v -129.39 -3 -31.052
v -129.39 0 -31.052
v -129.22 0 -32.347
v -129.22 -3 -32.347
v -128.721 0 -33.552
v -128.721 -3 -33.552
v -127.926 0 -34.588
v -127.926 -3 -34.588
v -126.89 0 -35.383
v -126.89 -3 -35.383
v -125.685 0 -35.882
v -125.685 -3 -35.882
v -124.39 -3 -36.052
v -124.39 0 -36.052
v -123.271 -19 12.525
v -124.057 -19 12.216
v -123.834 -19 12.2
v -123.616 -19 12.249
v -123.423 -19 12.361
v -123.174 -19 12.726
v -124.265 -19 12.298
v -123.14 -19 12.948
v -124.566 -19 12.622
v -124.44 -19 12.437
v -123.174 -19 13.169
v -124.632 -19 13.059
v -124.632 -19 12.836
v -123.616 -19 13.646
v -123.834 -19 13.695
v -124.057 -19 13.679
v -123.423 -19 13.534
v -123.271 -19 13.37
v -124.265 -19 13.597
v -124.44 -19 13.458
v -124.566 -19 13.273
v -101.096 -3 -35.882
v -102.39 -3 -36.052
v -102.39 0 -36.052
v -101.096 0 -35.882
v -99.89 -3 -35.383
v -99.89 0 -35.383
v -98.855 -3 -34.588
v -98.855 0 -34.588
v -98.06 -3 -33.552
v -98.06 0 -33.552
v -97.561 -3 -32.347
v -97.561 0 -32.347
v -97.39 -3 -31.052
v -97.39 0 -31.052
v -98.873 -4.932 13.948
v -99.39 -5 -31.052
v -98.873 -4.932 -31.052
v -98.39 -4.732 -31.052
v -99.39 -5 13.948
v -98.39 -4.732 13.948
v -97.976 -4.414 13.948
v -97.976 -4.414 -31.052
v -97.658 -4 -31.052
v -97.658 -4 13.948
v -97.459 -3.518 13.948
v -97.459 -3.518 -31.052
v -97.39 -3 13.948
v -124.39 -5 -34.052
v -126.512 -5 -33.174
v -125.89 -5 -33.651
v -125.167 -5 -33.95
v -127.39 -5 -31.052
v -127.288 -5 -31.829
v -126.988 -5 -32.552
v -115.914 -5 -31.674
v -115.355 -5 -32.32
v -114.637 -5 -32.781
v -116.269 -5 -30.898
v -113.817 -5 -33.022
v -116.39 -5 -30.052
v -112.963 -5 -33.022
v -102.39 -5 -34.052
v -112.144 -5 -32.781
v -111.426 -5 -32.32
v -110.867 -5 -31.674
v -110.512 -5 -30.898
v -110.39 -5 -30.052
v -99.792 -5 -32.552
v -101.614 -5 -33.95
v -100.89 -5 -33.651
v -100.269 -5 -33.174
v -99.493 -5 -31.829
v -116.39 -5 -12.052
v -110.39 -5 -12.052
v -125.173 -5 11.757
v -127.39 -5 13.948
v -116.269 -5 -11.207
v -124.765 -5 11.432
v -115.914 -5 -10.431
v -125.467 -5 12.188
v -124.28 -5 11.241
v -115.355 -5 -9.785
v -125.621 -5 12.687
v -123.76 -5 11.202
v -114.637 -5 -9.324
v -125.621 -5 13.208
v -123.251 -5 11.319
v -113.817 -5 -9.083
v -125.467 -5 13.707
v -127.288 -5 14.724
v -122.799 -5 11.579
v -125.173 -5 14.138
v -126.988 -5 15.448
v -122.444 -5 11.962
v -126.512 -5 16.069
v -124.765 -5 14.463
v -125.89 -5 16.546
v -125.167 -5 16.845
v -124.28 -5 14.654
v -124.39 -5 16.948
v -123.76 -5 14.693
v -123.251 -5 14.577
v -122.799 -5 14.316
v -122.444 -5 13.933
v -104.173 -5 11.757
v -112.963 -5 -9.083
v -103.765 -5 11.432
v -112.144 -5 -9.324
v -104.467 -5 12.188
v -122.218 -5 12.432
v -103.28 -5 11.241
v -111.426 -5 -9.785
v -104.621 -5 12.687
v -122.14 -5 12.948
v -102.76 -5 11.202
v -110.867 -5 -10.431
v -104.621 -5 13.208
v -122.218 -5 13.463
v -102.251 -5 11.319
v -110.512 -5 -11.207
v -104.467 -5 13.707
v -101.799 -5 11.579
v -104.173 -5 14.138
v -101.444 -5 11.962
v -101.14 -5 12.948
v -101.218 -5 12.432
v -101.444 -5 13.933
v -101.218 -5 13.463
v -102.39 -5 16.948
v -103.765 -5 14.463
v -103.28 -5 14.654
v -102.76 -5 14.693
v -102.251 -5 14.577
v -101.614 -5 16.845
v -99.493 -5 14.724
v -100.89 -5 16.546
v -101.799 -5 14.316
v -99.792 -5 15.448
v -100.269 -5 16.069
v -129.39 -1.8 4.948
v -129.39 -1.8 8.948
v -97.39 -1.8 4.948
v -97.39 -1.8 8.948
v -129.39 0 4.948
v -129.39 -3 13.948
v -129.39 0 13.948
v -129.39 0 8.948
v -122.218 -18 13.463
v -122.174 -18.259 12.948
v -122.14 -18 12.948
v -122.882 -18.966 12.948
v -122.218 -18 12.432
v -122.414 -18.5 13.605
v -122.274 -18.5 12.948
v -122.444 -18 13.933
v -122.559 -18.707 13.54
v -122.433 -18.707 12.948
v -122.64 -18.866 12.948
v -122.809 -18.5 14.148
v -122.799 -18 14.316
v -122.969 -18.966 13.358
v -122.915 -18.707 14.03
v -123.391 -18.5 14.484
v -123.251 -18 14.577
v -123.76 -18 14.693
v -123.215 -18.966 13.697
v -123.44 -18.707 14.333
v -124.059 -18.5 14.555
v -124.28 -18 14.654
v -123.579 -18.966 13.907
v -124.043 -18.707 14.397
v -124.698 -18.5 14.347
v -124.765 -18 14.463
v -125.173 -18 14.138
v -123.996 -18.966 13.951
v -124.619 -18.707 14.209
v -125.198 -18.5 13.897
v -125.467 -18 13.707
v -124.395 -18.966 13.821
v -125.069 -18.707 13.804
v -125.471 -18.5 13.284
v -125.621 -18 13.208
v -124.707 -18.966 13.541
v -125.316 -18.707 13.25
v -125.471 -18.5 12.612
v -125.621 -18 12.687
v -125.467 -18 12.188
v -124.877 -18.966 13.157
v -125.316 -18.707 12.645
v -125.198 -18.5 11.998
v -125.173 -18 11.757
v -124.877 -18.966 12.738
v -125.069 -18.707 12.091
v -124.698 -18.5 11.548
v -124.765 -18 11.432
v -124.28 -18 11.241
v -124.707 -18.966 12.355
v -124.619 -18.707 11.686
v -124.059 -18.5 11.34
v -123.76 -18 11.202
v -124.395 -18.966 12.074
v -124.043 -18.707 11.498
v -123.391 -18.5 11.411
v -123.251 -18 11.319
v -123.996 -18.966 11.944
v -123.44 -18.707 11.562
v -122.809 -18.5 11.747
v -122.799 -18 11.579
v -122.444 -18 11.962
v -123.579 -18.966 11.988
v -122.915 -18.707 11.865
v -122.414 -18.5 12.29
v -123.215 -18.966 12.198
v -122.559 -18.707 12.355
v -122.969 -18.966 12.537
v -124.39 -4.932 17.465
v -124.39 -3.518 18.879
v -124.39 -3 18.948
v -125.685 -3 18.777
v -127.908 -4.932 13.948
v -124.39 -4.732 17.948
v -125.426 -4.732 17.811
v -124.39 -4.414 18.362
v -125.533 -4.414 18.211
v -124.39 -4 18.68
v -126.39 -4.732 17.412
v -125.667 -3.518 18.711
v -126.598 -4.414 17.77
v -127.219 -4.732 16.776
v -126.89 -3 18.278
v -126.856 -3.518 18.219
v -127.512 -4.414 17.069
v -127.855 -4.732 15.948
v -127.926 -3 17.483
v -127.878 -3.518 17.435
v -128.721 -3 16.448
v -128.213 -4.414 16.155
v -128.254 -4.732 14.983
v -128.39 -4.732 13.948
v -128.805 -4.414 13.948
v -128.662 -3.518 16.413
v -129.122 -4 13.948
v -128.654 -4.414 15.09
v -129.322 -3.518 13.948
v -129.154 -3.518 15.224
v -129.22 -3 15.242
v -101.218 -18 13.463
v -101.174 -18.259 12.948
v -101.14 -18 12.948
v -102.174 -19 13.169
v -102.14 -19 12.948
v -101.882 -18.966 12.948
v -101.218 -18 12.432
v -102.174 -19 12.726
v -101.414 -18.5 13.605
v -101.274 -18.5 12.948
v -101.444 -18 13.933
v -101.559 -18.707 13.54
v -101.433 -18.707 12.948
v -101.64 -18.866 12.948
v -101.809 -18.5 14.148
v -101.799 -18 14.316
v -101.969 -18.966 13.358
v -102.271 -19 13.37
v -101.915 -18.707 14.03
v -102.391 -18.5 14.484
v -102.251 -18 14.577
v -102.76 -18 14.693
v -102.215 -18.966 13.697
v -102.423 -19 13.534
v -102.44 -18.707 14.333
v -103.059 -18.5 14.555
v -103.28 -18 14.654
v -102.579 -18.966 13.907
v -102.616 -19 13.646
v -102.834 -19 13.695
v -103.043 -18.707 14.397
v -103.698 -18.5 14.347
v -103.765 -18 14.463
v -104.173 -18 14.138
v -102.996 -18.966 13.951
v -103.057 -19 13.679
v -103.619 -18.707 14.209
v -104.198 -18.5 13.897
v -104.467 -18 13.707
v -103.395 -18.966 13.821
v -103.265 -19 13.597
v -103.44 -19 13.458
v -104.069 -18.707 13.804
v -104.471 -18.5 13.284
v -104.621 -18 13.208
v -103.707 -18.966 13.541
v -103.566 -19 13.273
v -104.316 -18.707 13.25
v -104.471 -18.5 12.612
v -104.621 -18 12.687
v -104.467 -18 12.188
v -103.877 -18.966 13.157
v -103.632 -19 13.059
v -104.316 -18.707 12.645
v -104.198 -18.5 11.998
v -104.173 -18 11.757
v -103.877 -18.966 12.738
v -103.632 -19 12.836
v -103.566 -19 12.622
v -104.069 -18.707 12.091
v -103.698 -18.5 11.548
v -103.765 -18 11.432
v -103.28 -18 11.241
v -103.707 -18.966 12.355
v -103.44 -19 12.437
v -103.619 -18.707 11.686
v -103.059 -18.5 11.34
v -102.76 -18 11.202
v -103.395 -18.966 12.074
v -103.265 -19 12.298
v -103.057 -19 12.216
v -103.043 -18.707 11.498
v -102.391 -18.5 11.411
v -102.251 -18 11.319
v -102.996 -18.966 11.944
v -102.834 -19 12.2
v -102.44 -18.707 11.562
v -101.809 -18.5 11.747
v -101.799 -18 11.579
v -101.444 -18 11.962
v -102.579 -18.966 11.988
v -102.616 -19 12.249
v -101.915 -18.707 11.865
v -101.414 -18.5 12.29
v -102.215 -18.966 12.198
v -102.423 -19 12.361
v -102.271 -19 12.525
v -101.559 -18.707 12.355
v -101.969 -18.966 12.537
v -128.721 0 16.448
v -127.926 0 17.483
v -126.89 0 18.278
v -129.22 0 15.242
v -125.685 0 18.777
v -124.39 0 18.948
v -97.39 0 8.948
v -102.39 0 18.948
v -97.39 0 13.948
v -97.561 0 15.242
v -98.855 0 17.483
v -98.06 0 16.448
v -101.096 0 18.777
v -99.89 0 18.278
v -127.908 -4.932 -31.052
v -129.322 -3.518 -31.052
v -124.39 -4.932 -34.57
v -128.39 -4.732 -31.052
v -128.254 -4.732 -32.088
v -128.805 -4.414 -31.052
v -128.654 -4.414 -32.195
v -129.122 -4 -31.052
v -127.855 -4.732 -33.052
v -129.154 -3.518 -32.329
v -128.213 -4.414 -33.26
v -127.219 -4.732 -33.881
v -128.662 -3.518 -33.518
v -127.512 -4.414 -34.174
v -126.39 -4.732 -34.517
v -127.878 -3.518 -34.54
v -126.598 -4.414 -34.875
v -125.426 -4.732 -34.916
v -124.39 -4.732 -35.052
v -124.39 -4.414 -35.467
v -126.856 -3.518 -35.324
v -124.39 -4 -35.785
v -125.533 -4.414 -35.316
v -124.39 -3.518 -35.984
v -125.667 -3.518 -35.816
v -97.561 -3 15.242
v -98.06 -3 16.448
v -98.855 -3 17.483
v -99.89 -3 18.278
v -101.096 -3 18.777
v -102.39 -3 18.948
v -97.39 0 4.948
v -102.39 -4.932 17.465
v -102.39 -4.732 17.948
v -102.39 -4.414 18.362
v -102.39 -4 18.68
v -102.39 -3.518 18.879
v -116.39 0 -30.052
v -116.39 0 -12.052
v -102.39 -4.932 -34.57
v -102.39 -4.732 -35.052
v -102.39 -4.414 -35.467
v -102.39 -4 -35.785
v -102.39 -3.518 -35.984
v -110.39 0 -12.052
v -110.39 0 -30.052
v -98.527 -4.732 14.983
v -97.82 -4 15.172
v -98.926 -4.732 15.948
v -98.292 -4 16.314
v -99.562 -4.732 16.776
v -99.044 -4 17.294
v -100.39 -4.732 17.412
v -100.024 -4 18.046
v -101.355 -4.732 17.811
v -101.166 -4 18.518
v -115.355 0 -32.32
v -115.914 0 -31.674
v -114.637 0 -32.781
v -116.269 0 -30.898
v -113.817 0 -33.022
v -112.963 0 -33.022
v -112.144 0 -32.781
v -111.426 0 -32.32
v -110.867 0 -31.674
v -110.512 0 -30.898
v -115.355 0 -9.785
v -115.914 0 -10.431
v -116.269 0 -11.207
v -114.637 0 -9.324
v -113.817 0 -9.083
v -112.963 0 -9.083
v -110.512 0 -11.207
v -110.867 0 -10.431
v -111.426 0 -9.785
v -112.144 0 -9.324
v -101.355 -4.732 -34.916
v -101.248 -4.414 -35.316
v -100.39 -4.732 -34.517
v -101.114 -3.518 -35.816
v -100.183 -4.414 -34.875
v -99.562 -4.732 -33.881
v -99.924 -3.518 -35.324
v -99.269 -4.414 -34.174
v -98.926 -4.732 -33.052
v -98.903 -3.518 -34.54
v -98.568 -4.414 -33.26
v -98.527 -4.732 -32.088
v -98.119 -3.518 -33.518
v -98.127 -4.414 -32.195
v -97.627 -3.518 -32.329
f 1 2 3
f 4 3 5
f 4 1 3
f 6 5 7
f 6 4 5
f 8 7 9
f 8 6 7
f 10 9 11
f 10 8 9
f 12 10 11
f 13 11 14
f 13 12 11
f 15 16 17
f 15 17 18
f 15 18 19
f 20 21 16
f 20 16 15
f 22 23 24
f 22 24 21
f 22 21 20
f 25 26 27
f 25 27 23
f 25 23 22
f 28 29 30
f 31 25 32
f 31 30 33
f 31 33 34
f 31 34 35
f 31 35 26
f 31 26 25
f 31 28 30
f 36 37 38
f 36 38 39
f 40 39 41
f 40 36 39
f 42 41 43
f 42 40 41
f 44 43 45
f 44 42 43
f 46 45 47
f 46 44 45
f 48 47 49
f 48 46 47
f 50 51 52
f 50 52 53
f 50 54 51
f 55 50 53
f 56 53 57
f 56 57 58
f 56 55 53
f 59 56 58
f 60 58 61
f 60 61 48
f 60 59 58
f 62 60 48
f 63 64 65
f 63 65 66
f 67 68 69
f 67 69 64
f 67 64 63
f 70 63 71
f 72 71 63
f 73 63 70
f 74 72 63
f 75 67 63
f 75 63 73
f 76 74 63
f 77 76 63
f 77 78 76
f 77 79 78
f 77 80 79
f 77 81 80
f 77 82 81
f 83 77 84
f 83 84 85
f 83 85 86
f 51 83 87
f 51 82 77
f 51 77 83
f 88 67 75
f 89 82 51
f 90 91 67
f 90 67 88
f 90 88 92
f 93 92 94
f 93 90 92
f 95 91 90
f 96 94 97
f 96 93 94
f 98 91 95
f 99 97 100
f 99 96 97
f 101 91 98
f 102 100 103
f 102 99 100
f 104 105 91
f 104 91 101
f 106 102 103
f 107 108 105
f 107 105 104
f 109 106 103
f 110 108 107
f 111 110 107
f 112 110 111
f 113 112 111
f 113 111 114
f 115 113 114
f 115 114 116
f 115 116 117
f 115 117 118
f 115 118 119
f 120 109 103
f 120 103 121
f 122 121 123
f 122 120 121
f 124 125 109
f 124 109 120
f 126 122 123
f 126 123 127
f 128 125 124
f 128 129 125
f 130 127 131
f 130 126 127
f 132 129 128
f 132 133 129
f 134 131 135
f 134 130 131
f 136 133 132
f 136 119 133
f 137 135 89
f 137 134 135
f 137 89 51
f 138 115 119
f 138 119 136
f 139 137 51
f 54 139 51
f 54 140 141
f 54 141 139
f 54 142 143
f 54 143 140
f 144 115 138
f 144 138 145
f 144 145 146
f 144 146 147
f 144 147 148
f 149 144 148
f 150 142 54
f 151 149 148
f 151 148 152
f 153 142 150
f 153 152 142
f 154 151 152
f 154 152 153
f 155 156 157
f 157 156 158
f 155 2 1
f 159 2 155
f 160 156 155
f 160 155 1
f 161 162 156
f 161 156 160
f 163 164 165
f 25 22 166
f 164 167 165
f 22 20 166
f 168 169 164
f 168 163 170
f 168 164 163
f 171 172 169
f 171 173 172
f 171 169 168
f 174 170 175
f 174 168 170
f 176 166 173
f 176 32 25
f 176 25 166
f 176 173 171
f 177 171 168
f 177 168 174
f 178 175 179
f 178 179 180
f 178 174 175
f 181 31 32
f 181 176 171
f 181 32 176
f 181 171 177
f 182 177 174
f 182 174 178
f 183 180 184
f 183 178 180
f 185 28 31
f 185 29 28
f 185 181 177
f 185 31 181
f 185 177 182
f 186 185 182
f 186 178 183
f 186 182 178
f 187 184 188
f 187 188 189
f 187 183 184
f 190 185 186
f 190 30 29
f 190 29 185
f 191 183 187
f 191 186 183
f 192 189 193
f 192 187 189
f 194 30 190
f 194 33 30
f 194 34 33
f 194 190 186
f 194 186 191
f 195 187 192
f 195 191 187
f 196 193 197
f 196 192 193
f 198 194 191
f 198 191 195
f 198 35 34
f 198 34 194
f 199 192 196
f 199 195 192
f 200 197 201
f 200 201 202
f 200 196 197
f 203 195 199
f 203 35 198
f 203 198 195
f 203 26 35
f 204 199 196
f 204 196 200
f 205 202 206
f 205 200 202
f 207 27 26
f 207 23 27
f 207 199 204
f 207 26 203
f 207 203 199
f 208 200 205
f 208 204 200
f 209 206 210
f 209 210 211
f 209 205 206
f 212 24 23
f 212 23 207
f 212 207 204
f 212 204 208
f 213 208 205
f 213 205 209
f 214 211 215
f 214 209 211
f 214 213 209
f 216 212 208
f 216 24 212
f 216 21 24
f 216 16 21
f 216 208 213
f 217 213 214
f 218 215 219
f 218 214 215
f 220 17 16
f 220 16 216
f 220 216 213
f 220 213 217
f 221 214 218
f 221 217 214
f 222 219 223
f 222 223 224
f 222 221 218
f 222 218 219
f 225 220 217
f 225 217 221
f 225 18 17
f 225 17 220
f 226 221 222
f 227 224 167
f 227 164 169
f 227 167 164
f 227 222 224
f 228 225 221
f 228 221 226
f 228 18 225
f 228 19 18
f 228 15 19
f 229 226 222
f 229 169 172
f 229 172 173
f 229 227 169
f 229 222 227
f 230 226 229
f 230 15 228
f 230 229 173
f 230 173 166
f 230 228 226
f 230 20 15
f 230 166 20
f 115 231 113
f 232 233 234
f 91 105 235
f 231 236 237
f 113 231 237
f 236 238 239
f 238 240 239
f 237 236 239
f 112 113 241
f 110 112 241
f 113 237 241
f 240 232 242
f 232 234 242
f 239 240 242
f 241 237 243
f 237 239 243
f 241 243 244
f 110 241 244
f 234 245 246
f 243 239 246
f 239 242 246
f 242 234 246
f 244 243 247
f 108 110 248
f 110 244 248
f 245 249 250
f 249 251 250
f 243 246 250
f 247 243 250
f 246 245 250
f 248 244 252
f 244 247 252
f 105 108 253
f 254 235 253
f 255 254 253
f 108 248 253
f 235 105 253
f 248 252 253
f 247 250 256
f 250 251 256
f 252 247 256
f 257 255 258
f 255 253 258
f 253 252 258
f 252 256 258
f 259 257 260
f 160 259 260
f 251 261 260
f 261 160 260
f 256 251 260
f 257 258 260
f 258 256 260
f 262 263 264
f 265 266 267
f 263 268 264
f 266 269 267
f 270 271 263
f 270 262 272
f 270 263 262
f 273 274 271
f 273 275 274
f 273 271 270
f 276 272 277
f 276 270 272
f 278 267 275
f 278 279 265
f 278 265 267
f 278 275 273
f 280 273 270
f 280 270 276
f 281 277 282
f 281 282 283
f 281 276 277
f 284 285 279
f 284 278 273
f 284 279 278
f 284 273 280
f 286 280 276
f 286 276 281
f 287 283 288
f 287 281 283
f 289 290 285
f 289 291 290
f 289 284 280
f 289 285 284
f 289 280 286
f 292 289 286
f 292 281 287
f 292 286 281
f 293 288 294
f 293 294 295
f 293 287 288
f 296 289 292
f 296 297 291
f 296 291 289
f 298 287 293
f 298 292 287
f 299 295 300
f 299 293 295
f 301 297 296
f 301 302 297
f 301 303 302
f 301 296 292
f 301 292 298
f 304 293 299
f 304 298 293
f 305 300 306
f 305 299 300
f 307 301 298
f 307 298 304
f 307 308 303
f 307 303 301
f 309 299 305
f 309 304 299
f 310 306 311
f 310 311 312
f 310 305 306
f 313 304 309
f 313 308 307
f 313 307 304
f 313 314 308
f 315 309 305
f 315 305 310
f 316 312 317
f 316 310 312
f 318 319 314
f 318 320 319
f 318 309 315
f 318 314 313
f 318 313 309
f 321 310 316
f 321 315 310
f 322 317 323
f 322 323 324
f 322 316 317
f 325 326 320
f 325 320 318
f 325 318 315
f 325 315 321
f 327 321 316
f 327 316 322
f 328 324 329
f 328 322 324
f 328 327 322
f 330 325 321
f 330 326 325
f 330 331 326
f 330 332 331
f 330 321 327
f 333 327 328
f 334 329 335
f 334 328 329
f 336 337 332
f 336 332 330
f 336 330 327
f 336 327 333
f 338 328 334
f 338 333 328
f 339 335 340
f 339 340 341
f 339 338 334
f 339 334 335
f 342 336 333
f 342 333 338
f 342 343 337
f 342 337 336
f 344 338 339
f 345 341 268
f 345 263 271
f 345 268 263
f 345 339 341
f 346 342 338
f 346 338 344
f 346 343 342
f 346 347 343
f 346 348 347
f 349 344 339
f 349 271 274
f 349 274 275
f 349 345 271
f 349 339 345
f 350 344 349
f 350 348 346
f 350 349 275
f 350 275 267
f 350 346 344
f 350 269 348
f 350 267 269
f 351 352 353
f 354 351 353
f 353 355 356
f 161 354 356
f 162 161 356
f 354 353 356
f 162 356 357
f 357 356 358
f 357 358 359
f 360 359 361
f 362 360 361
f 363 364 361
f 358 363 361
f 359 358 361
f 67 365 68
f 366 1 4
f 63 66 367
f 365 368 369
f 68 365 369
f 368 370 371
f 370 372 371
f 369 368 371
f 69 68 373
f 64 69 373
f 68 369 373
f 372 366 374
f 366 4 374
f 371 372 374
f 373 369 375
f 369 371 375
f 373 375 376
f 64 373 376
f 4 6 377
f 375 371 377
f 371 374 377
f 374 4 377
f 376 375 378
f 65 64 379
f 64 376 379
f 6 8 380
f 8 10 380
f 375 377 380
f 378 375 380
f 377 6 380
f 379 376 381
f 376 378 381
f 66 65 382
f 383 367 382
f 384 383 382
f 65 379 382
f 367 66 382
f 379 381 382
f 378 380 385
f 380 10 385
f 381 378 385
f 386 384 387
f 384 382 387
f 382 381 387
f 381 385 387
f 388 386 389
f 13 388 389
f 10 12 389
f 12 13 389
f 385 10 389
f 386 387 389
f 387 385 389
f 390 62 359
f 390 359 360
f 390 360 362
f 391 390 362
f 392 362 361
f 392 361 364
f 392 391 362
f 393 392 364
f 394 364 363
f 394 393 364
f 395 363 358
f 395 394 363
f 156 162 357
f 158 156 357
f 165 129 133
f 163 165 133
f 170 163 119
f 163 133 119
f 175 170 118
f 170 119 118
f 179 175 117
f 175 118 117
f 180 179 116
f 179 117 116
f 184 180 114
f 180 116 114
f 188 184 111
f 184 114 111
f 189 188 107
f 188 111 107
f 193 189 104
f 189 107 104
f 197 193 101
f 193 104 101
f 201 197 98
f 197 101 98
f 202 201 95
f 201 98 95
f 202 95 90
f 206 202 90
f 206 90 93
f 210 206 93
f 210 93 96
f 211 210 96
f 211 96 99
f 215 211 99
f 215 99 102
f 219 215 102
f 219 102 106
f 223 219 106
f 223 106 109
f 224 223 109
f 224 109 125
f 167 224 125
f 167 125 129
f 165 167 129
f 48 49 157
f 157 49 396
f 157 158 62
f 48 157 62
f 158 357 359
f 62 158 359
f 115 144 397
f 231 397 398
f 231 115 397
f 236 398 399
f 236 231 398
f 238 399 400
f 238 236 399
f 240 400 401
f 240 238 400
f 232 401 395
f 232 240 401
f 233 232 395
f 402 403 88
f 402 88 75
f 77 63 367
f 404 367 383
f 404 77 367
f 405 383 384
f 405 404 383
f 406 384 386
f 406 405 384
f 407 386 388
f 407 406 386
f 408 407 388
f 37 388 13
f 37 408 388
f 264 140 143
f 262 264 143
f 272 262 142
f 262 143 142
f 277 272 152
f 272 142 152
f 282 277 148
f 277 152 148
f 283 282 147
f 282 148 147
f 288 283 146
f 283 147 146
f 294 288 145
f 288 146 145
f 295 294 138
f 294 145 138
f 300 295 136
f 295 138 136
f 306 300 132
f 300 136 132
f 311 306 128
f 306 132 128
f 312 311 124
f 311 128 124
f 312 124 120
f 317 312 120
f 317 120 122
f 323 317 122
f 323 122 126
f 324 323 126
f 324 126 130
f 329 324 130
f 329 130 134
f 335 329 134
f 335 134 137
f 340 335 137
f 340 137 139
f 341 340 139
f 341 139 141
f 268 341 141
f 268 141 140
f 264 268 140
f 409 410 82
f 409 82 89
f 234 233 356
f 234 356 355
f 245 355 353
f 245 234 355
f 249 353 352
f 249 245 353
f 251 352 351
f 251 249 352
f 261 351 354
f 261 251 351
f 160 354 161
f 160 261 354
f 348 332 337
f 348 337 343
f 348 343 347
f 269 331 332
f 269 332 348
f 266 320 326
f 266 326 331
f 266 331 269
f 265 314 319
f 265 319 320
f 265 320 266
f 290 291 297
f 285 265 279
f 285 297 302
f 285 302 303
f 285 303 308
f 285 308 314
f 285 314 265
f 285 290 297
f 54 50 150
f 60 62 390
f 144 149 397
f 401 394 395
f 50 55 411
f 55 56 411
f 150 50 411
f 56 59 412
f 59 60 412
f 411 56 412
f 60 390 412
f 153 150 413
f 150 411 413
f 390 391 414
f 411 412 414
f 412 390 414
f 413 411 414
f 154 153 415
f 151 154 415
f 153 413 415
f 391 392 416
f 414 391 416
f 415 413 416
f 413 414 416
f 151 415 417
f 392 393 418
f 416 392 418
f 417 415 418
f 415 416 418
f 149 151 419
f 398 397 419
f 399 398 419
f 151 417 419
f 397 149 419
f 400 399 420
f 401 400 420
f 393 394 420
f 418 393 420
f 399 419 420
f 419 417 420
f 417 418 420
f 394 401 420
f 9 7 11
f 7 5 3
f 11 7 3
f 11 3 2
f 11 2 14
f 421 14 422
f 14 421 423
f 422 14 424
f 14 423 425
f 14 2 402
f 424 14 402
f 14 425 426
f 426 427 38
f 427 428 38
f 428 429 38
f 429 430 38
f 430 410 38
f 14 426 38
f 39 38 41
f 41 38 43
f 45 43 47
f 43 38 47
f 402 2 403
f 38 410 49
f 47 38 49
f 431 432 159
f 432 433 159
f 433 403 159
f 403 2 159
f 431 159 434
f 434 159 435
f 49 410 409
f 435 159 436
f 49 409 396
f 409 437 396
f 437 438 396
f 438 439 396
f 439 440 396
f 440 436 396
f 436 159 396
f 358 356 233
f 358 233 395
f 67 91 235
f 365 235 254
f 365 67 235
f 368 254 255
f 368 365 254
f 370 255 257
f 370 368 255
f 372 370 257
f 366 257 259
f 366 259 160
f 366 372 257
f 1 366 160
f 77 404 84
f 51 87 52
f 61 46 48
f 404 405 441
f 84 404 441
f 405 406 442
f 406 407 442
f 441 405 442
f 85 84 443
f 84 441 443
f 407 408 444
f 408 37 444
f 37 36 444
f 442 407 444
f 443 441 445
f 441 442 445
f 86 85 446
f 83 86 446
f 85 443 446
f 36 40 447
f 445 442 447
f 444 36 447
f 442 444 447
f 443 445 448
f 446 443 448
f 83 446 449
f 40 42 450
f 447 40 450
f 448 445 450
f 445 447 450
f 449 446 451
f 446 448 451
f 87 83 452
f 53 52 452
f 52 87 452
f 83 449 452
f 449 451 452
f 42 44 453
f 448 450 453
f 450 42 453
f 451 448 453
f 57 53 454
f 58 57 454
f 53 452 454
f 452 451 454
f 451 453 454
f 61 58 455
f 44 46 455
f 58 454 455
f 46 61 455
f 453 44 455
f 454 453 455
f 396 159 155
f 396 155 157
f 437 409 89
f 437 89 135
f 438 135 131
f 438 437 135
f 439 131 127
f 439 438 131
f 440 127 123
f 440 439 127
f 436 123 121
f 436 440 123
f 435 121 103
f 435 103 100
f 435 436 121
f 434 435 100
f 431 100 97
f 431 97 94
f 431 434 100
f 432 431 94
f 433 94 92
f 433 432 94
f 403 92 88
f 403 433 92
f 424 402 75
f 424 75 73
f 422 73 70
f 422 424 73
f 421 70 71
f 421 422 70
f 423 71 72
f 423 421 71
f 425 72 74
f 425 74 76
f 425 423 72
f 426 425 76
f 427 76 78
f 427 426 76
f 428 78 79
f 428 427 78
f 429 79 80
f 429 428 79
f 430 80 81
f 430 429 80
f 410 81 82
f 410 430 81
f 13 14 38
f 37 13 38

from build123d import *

# Parameters (mm, degrees)
F0_W     = 32
F0_H     = 55
F3_DEPTH = 5
F1_R     = 1.75
F4_DEPTH = 19
F5_DEPTH = 5
F6_W     = 50
F6_H     = 4
F7_DEPTH = 1.8
F8_R     = 5
F9_R     = 5
F10_R    = 5
F11_R    = 5
F12_R    = 2
F13_R    = 1


with BuildPart() as f3:
    # F0 (on Front) → F3 (new body)
    with BuildSketch(Plane.XZ):
        with Locations((-113.3904078007, -8.5524536016)):
            Rectangle(F0_W, F0_H)
    extrude(amount=F3_DEPTH)

    # F1 (on face) → F4 (join)
    with BuildSketch(Plane.XZ):
        with Locations((-123.8904078007, 12.9475463984)):
            Circle(F1_R)
        with Locations((-102.8904078007, 12.9475463984)):
            Circle(F1_R)
    extrude(amount=F4_DEPTH)

    # F2 (on face) → F5 (cut)
    with BuildSketch(Plane.XZ):
        with BuildLine():
            ThreePointArc((-116.3904078007, -12.0524536016), (-113.3904078007, -15.0524536016), (-110.3904078007, -12.0524536016))
            ThreePointArc((-110.3904078007, -12.0524536016), (-113.3904078007, -9.0524536016), (-116.3904078007, -12.0524536016))
        make_face()
        with BuildLine():
            Line((-110.3904078007, -30.0524536016), (-110.3904078007, -12.0524536016))
            ThreePointArc((-110.3904078007, -12.0524536016), (-113.3904078007, -15.0524536016), (-116.3904078007, -12.0524536016))
            Line((-116.3904078007, -12.0524536016), (-116.3904078007, -30.0524536016))
            ThreePointArc((-116.3904078007, -30.0524536016), (-113.3904078007, -27.0524536016), (-110.3904078007, -30.0524536016))
        make_face()
        with BuildLine():
            ThreePointArc((-116.3904078007, -30.0524536016), (-113.3904078007, -33.0524536016), (-110.3904078007, -30.0524536016))
            ThreePointArc((-110.3904078007, -30.0524536016), (-113.3904078007, -27.0524536016), (-116.3904078007, -30.0524536016))
        make_face()
    extrude(amount=F5_DEPTH, mode=Mode.SUBTRACT)

    # F6 (on Front) → F7 (cut)
    with BuildSketch(Plane.XZ):
        with Locations((-109.2482896921, 6.9475463984)):
            Rectangle(F6_W, F6_H)
    extrude(amount=F7_DEPTH, mode=Mode.SUBTRACT)

    # F8
    f8_edges = [f3.edges().sort_by_distance(p)[0] for p in [
        (-97.390408, -2.5, 18.947546),
    ]]
    fillet(f8_edges, radius=F8_R)

    # F9
    f9_edges = [f3.edges().sort_by_distance(p)[0] for p in [
        (-129.390408, -2.5, 18.947546),
    ]]
    fillet(f9_edges, radius=F9_R)

    # F10
    f10_edges = [f3.edges().sort_by_distance(p)[0] for p in [
        (-129.390408, -2.5, -36.052454),
    ]]
    fillet(f10_edges, radius=F10_R)

    # F11
    f11_edges = [f3.edges().sort_by_distance(p)[0] for p in [
        (-97.390408, -2.5, -36.052454),
    ]]
    fillet(f11_edges, radius=F11_R)

    # F12
    f12_edges = [f3.edges().sort_by_distance(p)[0] for p in [
        (-98.854874, -5, 17.48308),
        (-113.390408, -5, 18.947546),
        (-127.925942, -5, 17.48308),
        (-129.390408, -5, -8.552454),
        (-127.925942, -5, -34.587988),
        (-113.390408, -5, -36.052454),
        (-97.390408, -5, -8.552454),
    ]]
    fillet(f12_edges, radius=F12_R)

    # F13
    f13_edges = [f3.edges().sort_by_distance(p)[0] for p in [
        (-125.640408, -19, 12.947546),
        (-104.640408, -19, 12.947546),
    ]]
    fillet(f13_edges, radius=F13_R)


solid = f3.part
